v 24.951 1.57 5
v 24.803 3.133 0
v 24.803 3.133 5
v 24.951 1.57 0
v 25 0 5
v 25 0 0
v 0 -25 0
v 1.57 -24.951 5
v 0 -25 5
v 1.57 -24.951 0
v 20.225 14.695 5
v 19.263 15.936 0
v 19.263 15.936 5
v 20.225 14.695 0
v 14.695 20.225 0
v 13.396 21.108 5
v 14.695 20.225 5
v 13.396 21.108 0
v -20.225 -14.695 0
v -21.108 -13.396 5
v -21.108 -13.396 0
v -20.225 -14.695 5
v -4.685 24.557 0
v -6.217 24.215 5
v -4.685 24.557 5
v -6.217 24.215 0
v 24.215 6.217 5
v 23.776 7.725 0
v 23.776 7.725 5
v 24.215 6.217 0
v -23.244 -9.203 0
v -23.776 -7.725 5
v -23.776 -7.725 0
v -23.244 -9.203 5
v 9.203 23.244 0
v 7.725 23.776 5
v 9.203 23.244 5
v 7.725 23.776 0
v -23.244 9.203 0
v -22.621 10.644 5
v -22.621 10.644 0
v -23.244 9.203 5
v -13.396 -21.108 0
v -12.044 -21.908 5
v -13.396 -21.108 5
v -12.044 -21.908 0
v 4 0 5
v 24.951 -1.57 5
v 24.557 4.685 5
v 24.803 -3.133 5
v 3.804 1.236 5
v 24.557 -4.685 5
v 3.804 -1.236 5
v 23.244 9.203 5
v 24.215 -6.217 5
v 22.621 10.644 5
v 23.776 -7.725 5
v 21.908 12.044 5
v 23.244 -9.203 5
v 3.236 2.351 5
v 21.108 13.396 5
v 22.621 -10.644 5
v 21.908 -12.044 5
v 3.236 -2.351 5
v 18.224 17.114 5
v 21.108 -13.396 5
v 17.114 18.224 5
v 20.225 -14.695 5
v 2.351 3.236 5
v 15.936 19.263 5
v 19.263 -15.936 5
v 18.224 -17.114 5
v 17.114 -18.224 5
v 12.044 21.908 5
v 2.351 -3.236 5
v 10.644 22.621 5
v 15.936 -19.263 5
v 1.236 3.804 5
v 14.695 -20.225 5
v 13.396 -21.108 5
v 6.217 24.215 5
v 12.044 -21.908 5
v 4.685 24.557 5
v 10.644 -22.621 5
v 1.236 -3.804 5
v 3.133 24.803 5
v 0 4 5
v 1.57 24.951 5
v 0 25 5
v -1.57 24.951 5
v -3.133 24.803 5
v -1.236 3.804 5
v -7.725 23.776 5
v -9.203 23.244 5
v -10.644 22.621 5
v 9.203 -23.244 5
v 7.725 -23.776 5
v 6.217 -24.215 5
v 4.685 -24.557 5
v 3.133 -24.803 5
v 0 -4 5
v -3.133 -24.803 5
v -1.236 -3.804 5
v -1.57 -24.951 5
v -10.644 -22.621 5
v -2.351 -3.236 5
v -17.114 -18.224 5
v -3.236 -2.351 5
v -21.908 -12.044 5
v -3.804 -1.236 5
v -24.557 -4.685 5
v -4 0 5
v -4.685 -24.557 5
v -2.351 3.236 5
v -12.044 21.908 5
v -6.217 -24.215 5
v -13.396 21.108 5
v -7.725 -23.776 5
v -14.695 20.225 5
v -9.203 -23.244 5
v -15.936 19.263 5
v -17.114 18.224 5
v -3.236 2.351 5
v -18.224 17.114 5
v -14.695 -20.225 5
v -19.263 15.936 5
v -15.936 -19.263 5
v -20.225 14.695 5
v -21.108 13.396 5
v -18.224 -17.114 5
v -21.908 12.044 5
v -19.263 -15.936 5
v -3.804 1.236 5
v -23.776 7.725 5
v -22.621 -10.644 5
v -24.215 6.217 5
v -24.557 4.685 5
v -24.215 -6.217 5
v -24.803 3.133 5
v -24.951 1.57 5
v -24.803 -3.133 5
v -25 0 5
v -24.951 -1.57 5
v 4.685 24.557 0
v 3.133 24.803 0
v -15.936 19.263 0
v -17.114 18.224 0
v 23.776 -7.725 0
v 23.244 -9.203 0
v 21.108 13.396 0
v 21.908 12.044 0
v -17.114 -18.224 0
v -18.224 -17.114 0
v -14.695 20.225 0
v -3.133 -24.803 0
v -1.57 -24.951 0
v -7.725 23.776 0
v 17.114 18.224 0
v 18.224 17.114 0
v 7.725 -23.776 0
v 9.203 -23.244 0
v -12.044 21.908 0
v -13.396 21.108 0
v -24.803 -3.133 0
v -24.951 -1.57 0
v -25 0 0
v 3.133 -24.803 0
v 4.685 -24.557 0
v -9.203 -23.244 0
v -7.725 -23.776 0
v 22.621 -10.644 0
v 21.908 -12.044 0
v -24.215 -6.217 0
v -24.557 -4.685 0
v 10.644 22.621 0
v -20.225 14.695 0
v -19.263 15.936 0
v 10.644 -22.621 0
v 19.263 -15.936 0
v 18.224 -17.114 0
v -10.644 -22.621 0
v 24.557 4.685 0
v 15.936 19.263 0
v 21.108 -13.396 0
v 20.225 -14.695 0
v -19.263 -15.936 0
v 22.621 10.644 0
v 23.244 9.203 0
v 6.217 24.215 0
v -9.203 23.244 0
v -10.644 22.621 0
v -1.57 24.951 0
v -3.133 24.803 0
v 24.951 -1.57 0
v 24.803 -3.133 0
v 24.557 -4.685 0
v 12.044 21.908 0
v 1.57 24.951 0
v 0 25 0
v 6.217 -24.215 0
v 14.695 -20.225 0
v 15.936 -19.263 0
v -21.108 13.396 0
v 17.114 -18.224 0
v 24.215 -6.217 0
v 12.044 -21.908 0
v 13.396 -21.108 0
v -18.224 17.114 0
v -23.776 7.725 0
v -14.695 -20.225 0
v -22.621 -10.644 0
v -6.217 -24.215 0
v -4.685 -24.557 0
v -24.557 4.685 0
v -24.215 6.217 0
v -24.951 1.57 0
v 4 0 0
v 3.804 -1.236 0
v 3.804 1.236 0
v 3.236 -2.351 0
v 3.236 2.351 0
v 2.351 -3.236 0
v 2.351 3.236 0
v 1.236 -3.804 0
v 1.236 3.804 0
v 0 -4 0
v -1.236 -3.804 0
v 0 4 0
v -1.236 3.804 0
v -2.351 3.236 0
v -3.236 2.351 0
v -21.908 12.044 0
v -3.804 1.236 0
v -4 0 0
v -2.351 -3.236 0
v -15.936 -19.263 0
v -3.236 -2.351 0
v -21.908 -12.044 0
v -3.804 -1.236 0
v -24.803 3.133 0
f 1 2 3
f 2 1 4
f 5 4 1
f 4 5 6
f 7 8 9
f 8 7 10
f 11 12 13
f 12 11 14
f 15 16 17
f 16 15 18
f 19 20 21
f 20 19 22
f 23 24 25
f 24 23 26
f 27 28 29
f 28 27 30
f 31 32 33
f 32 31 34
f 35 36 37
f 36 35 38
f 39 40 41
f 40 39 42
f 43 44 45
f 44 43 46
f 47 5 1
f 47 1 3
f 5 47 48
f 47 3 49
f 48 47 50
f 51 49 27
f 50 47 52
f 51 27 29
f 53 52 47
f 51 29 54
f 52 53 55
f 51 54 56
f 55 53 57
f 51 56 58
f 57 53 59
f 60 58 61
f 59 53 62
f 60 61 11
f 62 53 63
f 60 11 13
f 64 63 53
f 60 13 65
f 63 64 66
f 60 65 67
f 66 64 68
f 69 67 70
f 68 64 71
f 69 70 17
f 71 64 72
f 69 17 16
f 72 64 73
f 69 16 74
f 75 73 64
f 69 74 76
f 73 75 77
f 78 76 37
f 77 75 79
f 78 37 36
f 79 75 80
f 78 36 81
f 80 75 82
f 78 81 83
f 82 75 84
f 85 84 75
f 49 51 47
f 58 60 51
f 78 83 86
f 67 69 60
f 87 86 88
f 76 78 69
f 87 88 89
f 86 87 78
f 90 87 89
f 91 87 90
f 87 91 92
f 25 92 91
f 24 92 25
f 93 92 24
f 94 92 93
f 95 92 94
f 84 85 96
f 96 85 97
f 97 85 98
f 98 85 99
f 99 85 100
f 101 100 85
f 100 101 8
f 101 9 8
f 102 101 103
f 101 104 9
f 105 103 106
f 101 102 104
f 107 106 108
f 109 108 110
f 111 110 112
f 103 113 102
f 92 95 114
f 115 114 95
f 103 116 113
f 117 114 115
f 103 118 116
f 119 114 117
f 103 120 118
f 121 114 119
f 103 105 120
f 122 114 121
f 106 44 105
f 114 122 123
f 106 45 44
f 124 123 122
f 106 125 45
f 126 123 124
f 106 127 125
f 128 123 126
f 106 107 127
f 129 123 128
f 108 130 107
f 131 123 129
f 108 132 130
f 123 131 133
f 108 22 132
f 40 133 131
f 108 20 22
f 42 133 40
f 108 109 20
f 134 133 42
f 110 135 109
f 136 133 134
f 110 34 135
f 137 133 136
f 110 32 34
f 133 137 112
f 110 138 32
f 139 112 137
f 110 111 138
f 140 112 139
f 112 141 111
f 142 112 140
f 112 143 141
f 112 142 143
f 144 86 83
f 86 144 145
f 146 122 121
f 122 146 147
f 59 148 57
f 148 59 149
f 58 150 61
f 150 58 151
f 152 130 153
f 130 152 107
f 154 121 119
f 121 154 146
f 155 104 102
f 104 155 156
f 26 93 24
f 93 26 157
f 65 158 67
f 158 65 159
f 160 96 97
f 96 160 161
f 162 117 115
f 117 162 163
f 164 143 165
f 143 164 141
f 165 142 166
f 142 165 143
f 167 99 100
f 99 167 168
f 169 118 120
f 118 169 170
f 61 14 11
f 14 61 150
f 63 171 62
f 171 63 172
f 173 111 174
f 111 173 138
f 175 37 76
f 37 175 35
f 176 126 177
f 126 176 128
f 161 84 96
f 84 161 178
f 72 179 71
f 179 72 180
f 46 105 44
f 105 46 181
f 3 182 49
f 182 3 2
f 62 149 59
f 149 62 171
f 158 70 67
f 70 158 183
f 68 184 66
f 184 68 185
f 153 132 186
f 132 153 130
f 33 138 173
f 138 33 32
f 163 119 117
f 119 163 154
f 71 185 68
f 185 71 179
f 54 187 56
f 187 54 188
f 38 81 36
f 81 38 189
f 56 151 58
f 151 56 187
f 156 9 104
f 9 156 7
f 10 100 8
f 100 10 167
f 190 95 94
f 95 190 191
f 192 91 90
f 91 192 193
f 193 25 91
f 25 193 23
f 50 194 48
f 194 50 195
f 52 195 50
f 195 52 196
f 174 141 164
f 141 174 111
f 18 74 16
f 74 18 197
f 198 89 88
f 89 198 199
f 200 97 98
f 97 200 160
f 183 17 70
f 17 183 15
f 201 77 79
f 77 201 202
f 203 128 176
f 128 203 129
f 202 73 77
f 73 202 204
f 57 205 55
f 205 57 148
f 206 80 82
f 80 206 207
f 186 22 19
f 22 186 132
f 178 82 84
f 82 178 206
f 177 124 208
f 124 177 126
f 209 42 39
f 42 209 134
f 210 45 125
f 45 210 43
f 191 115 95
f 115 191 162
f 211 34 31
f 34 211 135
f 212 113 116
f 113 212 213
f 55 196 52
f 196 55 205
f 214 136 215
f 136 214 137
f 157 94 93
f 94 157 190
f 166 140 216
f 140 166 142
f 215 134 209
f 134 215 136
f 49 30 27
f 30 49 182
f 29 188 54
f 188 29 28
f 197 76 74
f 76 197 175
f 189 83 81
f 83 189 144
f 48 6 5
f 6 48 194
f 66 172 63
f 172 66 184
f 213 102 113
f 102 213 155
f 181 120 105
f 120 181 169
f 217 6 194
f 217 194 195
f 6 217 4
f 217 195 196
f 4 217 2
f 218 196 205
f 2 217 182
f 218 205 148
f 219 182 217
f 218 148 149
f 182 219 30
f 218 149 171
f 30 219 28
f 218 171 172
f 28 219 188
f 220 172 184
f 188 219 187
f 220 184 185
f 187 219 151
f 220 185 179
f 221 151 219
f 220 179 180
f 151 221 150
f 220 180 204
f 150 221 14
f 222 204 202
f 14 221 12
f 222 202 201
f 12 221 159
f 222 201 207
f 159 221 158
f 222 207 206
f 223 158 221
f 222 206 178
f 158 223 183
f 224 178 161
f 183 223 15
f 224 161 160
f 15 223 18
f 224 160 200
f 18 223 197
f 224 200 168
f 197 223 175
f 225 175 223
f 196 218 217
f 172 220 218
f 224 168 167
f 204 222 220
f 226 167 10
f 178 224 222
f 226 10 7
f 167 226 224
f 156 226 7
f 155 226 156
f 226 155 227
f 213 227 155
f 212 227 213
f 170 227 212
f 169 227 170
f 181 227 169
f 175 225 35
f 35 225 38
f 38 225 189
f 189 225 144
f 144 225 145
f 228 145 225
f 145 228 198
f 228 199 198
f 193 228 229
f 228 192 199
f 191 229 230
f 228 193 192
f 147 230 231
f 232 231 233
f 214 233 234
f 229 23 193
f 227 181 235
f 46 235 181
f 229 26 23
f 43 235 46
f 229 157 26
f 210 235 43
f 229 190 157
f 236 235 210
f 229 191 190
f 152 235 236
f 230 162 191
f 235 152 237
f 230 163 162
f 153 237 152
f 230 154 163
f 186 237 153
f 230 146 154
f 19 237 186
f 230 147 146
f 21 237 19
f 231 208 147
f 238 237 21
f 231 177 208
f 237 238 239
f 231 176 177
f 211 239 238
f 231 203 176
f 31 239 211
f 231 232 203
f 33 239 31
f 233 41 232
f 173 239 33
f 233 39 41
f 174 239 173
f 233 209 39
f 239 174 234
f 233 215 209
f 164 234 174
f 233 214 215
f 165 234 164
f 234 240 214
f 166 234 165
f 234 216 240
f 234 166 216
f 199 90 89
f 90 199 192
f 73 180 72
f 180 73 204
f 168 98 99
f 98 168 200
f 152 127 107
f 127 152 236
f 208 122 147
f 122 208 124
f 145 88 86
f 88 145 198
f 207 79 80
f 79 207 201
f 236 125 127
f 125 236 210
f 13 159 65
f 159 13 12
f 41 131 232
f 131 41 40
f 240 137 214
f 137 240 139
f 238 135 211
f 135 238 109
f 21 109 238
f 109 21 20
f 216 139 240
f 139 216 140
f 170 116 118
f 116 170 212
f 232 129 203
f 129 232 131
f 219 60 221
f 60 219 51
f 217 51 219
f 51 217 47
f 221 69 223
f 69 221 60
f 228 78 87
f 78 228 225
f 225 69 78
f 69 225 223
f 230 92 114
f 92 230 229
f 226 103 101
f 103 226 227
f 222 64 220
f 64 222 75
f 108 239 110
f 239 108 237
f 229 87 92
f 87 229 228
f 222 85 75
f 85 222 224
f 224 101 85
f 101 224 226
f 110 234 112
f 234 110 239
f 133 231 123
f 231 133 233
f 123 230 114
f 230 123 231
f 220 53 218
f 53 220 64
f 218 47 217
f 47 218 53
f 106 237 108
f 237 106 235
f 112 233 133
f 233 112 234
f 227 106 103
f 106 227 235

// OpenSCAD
//--Parámetros de la rueda
grosor = 5;
diametro=50;
diam_eje=8;


//--Construcción de la rueda a partir
//--de los parametros
difference(){
    //--Base de la rueda
    cylinder(r=diametro/2,h=grosor, $fn=100);
    
    //--Taladro de 8mm
    cylinder(r=diam_eje/2, h=grosor*3, $fn=20, center=true);
}
